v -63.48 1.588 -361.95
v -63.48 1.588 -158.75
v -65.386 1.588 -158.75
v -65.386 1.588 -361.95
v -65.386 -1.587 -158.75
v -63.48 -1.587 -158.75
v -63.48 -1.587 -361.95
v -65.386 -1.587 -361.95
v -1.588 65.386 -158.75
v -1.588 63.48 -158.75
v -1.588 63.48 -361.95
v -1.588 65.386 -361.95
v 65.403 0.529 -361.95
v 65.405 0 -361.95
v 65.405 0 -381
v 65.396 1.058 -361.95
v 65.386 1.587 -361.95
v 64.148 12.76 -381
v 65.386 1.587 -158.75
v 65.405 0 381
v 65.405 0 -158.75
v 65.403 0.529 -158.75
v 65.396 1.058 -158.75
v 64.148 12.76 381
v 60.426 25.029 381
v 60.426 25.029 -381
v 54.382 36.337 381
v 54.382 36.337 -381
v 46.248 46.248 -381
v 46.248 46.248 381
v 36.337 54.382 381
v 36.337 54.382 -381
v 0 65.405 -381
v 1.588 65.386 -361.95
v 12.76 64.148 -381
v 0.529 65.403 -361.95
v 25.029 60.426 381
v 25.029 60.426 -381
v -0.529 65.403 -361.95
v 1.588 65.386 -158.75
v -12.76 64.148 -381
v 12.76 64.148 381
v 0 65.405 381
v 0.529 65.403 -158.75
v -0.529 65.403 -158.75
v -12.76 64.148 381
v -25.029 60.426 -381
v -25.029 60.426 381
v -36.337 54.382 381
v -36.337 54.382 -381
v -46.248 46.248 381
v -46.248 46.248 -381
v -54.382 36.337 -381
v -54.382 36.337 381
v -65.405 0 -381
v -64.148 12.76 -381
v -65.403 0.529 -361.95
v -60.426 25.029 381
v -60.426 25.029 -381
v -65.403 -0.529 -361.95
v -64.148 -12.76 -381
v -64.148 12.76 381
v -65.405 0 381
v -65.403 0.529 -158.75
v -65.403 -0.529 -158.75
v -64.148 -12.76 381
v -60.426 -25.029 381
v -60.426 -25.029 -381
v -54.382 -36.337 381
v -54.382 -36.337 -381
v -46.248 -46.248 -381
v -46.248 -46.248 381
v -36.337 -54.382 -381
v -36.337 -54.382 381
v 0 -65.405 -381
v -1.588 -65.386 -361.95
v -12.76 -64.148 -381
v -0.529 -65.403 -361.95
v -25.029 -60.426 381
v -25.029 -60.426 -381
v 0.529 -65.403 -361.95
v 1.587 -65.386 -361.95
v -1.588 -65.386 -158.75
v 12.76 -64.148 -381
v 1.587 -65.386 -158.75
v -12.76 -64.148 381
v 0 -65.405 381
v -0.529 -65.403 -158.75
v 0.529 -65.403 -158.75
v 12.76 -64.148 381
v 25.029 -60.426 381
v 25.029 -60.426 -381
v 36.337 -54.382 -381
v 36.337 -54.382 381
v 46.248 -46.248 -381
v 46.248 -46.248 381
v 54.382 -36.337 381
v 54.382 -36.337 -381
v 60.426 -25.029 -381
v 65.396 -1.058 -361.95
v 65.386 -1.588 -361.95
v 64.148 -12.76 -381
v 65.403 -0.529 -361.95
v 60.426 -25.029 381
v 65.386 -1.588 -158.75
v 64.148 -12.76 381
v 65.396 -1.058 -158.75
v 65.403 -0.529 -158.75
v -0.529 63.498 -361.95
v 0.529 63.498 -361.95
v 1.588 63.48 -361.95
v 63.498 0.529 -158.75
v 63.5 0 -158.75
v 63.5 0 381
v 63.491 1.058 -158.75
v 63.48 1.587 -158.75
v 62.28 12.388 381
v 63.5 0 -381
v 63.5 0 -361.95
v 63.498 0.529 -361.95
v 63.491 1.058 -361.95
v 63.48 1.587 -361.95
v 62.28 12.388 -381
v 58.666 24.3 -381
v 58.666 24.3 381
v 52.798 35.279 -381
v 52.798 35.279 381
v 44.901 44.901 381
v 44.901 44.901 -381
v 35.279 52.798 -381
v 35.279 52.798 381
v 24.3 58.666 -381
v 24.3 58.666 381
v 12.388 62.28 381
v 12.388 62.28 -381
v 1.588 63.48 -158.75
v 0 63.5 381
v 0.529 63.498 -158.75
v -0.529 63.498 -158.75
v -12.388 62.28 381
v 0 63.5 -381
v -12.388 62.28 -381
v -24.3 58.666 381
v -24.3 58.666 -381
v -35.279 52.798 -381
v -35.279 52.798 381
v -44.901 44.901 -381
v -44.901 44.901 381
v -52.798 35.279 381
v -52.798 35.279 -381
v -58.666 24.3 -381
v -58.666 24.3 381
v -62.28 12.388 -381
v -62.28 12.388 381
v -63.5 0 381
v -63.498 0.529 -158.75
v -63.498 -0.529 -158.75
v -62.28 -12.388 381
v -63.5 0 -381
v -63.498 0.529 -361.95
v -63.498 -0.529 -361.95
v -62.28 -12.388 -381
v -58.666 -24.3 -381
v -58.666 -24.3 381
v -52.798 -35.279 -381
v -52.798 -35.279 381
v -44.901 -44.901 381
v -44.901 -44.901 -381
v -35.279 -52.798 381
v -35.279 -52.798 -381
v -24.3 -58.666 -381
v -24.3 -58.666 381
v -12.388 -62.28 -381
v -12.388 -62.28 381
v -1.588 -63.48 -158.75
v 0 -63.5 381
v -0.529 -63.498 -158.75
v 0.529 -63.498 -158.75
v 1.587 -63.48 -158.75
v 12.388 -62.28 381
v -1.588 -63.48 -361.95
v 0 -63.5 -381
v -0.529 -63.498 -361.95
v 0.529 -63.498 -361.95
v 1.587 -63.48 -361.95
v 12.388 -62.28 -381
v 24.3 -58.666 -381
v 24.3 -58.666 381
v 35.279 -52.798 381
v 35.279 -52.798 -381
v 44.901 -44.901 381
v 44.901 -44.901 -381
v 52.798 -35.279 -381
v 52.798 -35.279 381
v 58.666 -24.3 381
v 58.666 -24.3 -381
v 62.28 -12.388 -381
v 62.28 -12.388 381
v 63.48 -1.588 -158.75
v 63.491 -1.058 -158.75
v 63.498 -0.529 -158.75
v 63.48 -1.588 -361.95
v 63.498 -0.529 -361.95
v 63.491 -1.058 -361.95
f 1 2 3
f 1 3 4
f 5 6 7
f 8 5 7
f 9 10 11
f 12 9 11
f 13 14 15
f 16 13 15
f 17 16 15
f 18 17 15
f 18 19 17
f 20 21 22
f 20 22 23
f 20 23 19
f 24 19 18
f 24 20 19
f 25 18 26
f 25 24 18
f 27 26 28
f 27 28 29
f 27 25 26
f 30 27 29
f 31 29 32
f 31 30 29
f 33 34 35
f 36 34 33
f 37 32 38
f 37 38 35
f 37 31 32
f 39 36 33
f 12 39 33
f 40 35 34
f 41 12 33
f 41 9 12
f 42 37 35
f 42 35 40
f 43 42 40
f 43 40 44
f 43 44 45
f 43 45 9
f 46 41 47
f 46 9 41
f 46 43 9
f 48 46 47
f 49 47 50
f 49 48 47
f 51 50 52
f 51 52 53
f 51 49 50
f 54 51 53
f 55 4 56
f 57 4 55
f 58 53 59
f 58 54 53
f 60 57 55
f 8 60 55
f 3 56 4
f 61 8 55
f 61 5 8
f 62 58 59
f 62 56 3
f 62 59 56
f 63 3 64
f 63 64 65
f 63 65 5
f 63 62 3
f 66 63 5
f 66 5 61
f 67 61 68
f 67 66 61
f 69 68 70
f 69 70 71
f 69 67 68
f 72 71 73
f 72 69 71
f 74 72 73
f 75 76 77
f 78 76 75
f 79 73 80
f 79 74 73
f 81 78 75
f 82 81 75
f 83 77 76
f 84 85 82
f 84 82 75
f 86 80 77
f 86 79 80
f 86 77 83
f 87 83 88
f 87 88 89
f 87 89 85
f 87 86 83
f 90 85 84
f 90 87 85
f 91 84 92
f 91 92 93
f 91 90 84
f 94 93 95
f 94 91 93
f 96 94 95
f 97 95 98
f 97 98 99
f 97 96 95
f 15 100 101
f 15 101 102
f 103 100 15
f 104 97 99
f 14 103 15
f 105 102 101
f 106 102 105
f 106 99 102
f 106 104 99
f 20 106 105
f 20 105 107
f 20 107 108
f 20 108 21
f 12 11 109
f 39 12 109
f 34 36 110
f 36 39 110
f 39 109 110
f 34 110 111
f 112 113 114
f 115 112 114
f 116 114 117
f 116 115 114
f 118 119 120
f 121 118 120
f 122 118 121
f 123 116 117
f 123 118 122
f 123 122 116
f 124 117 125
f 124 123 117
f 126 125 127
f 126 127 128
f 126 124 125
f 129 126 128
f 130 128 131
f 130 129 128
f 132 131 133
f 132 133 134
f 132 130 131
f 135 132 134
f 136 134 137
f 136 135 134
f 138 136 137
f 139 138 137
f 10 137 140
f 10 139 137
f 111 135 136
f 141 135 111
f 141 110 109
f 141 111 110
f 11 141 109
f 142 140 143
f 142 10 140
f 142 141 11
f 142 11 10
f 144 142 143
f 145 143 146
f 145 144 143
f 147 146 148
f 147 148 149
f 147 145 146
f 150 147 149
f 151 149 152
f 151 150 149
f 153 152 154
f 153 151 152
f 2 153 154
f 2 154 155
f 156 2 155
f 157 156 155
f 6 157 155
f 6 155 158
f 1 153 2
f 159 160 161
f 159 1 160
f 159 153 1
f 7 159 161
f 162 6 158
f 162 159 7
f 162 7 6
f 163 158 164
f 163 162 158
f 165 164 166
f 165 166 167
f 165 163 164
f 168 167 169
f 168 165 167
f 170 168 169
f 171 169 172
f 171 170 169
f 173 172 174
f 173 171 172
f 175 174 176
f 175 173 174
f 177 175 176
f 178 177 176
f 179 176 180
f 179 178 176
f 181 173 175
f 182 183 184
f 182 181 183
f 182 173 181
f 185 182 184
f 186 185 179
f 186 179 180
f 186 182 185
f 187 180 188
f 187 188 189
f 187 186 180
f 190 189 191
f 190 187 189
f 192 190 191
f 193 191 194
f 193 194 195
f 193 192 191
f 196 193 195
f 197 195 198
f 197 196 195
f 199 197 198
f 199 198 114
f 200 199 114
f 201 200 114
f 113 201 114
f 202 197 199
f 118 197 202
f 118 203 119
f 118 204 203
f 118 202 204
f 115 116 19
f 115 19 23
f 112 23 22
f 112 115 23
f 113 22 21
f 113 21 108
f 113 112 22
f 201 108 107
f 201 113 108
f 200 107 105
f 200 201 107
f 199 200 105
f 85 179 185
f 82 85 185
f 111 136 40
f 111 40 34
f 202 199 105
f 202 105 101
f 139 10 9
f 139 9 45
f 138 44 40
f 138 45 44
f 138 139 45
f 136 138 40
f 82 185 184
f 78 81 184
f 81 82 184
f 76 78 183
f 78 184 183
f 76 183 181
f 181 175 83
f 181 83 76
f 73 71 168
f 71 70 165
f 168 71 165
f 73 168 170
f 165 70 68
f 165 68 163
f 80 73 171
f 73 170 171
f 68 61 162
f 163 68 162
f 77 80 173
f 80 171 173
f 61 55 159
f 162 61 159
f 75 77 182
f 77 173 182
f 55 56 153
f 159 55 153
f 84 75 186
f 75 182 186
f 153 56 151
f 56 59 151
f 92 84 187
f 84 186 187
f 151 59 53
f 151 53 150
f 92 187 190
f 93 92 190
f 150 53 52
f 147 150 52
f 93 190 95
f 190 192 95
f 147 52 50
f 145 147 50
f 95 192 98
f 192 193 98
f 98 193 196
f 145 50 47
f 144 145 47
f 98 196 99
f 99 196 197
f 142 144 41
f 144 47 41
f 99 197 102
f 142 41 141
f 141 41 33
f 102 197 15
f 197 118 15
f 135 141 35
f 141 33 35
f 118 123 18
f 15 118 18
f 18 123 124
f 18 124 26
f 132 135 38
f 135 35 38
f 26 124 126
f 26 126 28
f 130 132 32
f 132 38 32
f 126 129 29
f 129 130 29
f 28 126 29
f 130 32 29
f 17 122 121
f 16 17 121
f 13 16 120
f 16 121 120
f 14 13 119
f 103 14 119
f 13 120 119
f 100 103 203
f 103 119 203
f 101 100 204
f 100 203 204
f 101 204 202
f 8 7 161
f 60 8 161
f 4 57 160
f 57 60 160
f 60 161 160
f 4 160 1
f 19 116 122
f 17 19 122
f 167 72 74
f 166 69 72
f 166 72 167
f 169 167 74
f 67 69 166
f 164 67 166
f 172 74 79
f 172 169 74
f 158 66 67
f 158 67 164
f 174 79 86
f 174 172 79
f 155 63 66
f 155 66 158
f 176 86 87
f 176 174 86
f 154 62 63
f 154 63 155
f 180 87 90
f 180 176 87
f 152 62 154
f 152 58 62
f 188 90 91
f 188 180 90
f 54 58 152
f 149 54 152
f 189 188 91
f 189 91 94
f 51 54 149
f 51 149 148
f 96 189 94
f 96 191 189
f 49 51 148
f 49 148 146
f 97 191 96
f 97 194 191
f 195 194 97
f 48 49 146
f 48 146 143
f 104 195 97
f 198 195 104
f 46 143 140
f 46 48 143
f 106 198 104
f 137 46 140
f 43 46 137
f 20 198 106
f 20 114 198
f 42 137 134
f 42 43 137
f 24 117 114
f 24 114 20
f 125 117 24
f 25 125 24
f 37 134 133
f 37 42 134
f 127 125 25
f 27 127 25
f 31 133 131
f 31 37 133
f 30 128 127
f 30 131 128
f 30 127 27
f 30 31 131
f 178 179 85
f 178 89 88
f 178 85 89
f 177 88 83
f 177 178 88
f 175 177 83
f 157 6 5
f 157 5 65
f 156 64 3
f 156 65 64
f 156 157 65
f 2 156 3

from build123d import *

# Parameters (mm, degrees)
SKETCH1_R           = 65.405
SKETCH1_R_2         = 63.5
BOSS_EXTRUDE1_DEPTH = 381
SKETCH3_W           = 3.175
SKETCH3_H           = 203.2
CUT_EXTRUDE1_DEPTH  = 66.405
CIRPATTERN1_COUNT   = 4


with BuildPart() as part:
    # Sketch1 → Boss-Extrude1 (new body, symmetric)
    with BuildSketch(Plane.XY):
        Circle(SKETCH1_R)
        Circle(SKETCH1_R_2, mode=Mode.SUBTRACT)
    extrude(amount=BOSS_EXTRUDE1_DEPTH, both=True)

    # Sketch3 → Cut-Extrude1 (cut, through all)
    with BuildSketch(Plane(origin=(0, 0, 0), x_dir=(1, 0, 0), z_dir=(0, 1, 0))):
        with Locations((0, 260.35)):
            Rectangle(SKETCH3_W, SKETCH3_H)
    cut_extrude1 = extrude(amount=CUT_EXTRUDE1_DEPTH, mode=Mode.SUBTRACT)

    # CirPattern1: Cut-Extrude1 ×4 about axis
    cirpattern1_axis = Axis((0, 0, 0), (0, 0, 1))
    for i in range(1, CIRPATTERN1_COUNT):
        add(cut_extrude1.rotate(cirpattern1_axis, i * 360 / CIRPATTERN1_COUNT), mode=Mode.SUBTRACT)


solid = part.part
